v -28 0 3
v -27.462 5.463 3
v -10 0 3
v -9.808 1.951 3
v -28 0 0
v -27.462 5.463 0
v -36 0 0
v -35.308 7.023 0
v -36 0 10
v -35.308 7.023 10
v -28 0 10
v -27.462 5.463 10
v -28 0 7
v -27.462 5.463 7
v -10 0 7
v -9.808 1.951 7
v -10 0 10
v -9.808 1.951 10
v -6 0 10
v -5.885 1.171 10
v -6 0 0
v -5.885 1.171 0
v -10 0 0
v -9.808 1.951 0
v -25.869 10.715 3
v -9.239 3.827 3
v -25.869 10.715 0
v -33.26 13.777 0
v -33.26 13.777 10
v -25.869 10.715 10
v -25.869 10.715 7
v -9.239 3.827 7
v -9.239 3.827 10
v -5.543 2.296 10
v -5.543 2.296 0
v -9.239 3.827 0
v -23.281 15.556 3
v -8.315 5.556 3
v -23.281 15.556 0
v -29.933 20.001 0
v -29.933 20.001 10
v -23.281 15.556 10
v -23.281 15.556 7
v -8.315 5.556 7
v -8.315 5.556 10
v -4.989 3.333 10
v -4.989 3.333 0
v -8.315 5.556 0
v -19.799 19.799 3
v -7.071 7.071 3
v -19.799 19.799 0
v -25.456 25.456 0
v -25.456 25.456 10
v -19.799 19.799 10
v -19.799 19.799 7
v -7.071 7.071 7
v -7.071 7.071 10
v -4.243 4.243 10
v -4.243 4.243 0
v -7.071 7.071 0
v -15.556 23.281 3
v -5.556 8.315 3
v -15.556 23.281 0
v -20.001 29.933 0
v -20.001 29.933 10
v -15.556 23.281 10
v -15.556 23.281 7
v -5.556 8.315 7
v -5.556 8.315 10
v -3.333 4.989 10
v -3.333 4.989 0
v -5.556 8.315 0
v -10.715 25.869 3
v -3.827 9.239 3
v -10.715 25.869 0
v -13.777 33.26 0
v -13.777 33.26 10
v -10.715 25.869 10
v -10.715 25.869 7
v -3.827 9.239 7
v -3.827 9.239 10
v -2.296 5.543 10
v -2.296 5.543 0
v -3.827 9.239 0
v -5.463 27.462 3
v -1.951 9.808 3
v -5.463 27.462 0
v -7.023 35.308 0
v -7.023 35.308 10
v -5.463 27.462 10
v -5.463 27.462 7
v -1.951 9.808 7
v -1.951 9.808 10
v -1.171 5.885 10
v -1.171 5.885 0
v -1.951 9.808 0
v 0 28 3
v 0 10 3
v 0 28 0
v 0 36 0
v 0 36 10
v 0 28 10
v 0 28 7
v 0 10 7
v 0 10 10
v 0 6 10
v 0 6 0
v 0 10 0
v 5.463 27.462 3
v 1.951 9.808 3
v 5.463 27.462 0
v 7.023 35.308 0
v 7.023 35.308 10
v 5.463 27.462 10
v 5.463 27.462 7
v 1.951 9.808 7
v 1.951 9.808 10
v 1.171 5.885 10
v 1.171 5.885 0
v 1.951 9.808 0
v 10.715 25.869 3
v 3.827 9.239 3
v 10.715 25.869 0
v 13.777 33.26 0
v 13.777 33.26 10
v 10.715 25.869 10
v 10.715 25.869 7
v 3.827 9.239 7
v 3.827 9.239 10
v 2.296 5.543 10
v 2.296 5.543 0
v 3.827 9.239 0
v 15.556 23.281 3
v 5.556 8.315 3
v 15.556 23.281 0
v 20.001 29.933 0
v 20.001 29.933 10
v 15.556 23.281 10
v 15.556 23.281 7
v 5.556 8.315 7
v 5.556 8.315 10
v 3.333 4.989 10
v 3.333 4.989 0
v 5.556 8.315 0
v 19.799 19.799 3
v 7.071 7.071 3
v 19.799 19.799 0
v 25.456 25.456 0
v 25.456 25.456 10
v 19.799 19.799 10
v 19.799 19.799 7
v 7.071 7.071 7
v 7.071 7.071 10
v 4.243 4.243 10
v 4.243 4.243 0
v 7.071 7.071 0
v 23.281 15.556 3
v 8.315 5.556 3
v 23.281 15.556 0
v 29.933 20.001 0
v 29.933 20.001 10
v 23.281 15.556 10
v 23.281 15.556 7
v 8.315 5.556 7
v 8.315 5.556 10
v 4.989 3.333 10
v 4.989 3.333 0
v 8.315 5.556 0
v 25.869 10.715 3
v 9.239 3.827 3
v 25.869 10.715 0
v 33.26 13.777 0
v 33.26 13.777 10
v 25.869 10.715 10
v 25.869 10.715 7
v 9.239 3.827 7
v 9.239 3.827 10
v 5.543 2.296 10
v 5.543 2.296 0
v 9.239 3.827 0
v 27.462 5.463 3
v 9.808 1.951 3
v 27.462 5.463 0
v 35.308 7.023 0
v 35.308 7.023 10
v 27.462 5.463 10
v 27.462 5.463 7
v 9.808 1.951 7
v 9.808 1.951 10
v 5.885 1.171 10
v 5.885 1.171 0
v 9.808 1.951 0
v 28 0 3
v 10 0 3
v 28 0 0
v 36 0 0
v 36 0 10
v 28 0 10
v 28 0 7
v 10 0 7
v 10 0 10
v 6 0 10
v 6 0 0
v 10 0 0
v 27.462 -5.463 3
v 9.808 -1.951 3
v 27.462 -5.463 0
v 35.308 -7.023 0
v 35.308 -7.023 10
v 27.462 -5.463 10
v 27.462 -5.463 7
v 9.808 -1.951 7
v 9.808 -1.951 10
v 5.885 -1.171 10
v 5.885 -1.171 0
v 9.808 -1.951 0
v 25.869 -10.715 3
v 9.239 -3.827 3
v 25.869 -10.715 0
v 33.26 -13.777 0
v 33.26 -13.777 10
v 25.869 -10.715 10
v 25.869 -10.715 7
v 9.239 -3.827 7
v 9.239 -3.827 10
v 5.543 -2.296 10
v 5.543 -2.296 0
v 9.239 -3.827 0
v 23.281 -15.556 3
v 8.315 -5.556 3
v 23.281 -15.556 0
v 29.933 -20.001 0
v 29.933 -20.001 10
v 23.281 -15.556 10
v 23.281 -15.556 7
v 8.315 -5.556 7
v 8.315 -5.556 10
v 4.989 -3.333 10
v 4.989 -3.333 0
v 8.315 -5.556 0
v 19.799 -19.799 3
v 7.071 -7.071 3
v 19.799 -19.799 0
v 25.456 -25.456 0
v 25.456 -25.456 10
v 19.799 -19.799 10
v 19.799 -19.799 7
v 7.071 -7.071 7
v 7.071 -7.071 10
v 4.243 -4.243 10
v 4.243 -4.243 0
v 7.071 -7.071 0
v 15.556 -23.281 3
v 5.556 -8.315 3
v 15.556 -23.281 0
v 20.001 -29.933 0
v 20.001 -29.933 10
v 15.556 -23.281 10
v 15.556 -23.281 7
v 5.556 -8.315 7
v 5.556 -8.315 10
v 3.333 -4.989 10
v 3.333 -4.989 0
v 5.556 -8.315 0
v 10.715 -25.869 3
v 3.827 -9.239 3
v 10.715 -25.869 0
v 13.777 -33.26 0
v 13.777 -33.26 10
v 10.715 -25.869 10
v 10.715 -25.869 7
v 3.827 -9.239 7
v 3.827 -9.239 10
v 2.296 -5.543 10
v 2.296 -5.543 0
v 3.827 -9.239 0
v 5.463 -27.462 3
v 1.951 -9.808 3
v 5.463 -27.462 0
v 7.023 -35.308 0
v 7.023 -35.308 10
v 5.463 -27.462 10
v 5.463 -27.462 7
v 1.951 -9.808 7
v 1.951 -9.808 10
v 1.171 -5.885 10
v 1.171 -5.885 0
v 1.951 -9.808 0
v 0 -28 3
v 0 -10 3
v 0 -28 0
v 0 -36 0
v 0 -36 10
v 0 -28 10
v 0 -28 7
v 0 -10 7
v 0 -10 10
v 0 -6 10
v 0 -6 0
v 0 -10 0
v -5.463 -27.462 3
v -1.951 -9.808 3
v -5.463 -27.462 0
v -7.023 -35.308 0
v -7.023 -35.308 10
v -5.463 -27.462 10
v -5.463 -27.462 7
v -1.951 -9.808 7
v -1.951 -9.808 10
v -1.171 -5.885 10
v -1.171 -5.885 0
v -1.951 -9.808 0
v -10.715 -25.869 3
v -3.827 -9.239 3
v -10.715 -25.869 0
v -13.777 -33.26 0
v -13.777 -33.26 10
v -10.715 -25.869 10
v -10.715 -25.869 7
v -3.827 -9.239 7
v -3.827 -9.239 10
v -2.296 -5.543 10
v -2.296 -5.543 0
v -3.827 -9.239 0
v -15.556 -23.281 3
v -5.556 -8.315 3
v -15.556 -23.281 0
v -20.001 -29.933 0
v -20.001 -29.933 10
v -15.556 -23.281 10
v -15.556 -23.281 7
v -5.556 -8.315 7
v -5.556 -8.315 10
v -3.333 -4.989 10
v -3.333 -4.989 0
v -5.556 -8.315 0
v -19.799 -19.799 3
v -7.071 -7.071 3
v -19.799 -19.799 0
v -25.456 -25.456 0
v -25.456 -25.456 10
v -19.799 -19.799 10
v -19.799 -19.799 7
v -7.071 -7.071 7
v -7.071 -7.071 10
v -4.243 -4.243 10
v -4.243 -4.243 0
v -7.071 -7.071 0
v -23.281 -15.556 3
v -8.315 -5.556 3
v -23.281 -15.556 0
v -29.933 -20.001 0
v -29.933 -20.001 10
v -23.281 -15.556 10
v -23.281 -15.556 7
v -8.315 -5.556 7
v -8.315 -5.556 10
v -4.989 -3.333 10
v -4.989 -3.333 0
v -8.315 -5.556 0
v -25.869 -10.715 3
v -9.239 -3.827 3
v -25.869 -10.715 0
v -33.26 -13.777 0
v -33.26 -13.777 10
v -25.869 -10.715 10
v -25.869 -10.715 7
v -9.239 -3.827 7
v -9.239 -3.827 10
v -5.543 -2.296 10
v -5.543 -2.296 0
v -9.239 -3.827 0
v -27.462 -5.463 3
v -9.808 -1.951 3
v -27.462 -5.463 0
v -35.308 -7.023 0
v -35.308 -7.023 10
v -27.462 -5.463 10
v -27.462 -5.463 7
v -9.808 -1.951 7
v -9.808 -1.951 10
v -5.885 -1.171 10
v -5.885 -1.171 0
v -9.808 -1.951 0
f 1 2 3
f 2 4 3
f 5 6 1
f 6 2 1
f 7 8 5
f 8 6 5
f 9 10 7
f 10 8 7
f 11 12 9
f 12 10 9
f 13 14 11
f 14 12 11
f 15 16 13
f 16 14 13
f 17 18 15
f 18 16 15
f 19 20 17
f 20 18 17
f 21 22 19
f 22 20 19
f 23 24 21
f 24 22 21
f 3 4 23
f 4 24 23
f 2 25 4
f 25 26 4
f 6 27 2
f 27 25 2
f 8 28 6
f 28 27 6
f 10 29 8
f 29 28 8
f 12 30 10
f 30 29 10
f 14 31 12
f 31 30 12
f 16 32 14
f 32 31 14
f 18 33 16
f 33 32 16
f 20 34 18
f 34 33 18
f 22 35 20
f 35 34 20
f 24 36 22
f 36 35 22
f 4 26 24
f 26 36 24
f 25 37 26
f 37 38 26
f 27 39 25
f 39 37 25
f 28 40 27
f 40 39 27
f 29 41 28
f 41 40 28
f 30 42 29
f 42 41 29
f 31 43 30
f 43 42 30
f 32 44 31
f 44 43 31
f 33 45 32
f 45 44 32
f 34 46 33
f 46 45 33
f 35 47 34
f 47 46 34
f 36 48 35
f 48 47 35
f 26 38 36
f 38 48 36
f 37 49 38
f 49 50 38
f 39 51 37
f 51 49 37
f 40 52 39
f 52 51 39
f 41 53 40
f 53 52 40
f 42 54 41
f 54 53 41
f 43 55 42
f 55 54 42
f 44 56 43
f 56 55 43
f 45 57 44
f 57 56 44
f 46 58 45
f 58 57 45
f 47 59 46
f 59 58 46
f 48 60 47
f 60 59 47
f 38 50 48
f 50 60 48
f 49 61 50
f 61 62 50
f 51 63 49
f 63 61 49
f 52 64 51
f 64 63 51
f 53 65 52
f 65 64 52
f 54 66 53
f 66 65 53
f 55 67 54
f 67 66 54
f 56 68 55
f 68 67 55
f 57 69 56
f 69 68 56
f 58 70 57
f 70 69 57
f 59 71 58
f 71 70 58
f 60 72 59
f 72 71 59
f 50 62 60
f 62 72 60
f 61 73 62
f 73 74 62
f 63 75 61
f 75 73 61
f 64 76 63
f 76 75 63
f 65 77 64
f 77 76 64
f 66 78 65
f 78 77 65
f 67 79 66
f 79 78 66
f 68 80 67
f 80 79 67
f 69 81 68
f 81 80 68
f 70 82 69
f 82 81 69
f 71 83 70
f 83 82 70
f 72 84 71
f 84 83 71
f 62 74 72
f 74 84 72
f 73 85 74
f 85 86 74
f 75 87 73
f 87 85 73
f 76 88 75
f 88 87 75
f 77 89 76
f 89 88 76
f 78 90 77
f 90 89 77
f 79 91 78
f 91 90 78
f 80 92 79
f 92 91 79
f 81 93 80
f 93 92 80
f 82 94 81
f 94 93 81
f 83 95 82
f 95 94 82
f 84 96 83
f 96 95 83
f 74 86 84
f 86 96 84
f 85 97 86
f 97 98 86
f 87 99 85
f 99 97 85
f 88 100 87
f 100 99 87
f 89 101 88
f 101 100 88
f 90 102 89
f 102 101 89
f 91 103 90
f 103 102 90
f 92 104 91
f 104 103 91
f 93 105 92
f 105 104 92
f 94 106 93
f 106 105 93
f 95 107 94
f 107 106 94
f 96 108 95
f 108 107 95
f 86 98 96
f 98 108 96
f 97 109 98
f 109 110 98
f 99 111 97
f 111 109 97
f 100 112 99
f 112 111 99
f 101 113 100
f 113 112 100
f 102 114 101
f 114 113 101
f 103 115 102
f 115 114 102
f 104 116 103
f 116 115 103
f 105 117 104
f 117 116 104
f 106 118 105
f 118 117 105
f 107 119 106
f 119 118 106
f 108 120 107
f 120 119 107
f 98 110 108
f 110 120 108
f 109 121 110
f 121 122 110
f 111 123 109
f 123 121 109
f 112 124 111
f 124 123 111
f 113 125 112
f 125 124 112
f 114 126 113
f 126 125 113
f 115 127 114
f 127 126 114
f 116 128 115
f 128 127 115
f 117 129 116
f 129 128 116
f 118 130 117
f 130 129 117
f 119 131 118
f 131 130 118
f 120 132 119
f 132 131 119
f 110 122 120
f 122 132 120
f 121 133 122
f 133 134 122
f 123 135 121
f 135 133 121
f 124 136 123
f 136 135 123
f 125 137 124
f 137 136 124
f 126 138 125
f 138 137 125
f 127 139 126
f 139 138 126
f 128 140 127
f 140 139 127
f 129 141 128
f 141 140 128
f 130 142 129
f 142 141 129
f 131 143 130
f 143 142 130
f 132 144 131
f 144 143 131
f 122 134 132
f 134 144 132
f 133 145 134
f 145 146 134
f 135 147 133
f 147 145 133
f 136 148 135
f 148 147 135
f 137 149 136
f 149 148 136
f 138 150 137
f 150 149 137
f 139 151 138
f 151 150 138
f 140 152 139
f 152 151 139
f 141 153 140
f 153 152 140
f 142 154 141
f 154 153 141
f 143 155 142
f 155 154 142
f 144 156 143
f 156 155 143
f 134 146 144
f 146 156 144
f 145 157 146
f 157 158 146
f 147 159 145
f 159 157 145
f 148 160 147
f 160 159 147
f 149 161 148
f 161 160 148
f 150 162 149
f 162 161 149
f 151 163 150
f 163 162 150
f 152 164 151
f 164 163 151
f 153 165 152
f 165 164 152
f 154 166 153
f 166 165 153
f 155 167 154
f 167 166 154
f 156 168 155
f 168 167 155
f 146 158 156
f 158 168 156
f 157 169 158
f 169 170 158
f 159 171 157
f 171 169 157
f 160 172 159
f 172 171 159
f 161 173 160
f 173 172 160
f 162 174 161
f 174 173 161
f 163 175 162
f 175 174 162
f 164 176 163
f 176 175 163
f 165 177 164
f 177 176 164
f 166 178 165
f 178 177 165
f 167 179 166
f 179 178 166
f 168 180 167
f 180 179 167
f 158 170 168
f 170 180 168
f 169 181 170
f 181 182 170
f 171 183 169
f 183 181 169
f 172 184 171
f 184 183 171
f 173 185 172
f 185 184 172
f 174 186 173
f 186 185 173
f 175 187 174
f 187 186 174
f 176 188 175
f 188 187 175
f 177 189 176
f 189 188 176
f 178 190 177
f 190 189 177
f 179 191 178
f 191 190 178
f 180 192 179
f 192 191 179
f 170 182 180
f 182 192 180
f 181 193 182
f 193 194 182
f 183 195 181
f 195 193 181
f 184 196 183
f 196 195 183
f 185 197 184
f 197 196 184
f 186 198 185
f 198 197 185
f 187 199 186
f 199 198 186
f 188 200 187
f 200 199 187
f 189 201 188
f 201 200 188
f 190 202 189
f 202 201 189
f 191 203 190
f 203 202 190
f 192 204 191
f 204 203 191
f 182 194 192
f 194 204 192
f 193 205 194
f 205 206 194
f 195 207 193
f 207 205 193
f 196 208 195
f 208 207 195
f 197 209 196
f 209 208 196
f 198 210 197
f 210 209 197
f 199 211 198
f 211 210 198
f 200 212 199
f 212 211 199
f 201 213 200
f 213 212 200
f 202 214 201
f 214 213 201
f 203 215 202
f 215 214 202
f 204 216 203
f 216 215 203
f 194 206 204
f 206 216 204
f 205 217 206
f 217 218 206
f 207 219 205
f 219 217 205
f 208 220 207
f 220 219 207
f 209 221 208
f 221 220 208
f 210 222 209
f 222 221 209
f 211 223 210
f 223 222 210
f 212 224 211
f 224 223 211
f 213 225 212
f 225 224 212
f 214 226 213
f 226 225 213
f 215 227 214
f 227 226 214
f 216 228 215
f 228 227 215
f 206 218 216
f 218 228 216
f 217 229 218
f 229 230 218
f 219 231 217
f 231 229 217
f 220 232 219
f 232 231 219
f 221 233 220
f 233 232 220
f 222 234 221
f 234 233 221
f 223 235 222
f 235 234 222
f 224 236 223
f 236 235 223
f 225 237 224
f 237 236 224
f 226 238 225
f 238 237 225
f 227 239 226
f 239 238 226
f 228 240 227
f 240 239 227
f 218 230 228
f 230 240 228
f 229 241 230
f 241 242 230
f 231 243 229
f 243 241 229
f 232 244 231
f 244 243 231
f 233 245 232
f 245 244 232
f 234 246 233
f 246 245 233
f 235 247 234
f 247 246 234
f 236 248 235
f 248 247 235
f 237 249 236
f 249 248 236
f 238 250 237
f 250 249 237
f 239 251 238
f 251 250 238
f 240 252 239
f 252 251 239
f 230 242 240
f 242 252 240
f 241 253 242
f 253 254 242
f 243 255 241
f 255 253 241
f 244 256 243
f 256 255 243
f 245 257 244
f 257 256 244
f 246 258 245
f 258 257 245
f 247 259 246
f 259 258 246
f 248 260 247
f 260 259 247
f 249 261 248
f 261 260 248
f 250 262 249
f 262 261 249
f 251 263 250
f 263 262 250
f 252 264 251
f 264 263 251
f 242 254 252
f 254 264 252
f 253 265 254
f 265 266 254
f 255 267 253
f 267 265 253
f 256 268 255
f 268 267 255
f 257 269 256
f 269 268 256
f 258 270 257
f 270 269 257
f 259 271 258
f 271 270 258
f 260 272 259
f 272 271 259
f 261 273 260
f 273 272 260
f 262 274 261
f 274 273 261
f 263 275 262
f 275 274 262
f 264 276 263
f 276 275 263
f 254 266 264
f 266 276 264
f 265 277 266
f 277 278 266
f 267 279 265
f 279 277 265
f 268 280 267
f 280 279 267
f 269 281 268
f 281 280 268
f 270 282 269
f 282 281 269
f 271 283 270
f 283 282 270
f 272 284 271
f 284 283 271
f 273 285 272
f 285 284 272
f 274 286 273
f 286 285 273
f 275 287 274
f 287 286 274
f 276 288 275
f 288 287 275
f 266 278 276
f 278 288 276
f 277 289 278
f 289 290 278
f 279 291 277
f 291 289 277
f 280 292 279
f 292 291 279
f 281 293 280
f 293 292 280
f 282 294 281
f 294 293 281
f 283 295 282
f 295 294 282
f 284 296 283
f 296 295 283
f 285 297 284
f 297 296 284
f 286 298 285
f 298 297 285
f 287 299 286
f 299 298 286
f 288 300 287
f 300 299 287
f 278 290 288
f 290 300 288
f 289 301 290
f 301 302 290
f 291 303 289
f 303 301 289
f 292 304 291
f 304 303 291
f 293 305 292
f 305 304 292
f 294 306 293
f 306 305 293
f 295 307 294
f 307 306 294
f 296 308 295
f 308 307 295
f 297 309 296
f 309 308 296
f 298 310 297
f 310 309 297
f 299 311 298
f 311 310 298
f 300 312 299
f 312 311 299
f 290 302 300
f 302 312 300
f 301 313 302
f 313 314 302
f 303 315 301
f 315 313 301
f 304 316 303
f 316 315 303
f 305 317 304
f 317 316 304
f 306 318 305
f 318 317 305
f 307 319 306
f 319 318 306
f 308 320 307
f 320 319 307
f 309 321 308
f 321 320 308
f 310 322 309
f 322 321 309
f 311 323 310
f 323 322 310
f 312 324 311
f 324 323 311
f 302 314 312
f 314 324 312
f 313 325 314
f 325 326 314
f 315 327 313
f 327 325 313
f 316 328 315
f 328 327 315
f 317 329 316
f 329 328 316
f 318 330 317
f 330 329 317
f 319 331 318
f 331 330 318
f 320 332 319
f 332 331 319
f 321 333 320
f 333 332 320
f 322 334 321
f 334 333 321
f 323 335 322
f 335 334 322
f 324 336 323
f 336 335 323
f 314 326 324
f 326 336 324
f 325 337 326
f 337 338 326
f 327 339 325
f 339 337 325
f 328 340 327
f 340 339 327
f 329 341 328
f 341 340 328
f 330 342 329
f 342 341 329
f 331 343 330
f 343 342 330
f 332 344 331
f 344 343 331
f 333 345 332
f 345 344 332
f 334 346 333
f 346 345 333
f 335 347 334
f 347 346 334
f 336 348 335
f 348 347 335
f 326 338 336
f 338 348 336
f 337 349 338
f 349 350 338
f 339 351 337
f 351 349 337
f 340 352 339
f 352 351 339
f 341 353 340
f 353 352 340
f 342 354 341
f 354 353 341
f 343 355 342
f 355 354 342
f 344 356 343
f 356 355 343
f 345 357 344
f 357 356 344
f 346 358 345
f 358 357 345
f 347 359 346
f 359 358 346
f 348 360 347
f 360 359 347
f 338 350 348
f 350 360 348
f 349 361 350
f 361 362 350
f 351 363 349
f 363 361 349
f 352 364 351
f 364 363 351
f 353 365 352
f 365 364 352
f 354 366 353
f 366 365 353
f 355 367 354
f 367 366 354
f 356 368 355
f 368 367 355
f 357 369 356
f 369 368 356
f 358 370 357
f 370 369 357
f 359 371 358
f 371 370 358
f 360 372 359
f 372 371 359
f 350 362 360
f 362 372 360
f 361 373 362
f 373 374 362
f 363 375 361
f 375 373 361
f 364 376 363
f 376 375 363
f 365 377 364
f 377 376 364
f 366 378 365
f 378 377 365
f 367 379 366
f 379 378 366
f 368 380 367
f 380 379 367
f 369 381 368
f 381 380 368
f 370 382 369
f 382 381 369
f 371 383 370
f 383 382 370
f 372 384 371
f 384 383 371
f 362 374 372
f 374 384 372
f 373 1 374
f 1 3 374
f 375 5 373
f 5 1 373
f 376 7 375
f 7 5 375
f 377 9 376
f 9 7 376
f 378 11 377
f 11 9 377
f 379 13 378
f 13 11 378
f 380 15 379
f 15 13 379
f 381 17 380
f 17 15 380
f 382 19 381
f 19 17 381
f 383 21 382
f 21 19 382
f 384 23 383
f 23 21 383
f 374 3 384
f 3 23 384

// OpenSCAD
$fn = 32;

// ----------------------------------------------------------------------
// Revolved part: handwheel R36
// ----------------------------------------------------------------------

// --- parameters (mm) ---
bore_r = 6;               // bore radius
rim_r = 36;               // rim radius
rim_w = 8;                // rim axial width
rim_t = 10;               // rim diameter height
hub_r = 10;               // hub radius
web_t = 4;                // web thickness
revolve_angle = 360;      // revolve sweep, degrees
fit_tol = 0.05;           // declared fit tolerance (prompt contract)
free_tol = 0.3;           // declared free tolerance (prompt contract)

bore_d = 2 * bore_r;
rim_d = 2 * rim_r;
hub_d = 2 * hub_r;

profile = [[6, 0], [10, 0], [10, 3], [28, 3], [28, 0], [36, 0], [36, 10], [28, 10], [28, 7], [10, 7], [10, 10], [6, 10]];  // primary outline, 12 points, counter clockwise

// --- the one profile operation ---
rotate_extrude(angle = revolve_angle) polygon(points = profile);
